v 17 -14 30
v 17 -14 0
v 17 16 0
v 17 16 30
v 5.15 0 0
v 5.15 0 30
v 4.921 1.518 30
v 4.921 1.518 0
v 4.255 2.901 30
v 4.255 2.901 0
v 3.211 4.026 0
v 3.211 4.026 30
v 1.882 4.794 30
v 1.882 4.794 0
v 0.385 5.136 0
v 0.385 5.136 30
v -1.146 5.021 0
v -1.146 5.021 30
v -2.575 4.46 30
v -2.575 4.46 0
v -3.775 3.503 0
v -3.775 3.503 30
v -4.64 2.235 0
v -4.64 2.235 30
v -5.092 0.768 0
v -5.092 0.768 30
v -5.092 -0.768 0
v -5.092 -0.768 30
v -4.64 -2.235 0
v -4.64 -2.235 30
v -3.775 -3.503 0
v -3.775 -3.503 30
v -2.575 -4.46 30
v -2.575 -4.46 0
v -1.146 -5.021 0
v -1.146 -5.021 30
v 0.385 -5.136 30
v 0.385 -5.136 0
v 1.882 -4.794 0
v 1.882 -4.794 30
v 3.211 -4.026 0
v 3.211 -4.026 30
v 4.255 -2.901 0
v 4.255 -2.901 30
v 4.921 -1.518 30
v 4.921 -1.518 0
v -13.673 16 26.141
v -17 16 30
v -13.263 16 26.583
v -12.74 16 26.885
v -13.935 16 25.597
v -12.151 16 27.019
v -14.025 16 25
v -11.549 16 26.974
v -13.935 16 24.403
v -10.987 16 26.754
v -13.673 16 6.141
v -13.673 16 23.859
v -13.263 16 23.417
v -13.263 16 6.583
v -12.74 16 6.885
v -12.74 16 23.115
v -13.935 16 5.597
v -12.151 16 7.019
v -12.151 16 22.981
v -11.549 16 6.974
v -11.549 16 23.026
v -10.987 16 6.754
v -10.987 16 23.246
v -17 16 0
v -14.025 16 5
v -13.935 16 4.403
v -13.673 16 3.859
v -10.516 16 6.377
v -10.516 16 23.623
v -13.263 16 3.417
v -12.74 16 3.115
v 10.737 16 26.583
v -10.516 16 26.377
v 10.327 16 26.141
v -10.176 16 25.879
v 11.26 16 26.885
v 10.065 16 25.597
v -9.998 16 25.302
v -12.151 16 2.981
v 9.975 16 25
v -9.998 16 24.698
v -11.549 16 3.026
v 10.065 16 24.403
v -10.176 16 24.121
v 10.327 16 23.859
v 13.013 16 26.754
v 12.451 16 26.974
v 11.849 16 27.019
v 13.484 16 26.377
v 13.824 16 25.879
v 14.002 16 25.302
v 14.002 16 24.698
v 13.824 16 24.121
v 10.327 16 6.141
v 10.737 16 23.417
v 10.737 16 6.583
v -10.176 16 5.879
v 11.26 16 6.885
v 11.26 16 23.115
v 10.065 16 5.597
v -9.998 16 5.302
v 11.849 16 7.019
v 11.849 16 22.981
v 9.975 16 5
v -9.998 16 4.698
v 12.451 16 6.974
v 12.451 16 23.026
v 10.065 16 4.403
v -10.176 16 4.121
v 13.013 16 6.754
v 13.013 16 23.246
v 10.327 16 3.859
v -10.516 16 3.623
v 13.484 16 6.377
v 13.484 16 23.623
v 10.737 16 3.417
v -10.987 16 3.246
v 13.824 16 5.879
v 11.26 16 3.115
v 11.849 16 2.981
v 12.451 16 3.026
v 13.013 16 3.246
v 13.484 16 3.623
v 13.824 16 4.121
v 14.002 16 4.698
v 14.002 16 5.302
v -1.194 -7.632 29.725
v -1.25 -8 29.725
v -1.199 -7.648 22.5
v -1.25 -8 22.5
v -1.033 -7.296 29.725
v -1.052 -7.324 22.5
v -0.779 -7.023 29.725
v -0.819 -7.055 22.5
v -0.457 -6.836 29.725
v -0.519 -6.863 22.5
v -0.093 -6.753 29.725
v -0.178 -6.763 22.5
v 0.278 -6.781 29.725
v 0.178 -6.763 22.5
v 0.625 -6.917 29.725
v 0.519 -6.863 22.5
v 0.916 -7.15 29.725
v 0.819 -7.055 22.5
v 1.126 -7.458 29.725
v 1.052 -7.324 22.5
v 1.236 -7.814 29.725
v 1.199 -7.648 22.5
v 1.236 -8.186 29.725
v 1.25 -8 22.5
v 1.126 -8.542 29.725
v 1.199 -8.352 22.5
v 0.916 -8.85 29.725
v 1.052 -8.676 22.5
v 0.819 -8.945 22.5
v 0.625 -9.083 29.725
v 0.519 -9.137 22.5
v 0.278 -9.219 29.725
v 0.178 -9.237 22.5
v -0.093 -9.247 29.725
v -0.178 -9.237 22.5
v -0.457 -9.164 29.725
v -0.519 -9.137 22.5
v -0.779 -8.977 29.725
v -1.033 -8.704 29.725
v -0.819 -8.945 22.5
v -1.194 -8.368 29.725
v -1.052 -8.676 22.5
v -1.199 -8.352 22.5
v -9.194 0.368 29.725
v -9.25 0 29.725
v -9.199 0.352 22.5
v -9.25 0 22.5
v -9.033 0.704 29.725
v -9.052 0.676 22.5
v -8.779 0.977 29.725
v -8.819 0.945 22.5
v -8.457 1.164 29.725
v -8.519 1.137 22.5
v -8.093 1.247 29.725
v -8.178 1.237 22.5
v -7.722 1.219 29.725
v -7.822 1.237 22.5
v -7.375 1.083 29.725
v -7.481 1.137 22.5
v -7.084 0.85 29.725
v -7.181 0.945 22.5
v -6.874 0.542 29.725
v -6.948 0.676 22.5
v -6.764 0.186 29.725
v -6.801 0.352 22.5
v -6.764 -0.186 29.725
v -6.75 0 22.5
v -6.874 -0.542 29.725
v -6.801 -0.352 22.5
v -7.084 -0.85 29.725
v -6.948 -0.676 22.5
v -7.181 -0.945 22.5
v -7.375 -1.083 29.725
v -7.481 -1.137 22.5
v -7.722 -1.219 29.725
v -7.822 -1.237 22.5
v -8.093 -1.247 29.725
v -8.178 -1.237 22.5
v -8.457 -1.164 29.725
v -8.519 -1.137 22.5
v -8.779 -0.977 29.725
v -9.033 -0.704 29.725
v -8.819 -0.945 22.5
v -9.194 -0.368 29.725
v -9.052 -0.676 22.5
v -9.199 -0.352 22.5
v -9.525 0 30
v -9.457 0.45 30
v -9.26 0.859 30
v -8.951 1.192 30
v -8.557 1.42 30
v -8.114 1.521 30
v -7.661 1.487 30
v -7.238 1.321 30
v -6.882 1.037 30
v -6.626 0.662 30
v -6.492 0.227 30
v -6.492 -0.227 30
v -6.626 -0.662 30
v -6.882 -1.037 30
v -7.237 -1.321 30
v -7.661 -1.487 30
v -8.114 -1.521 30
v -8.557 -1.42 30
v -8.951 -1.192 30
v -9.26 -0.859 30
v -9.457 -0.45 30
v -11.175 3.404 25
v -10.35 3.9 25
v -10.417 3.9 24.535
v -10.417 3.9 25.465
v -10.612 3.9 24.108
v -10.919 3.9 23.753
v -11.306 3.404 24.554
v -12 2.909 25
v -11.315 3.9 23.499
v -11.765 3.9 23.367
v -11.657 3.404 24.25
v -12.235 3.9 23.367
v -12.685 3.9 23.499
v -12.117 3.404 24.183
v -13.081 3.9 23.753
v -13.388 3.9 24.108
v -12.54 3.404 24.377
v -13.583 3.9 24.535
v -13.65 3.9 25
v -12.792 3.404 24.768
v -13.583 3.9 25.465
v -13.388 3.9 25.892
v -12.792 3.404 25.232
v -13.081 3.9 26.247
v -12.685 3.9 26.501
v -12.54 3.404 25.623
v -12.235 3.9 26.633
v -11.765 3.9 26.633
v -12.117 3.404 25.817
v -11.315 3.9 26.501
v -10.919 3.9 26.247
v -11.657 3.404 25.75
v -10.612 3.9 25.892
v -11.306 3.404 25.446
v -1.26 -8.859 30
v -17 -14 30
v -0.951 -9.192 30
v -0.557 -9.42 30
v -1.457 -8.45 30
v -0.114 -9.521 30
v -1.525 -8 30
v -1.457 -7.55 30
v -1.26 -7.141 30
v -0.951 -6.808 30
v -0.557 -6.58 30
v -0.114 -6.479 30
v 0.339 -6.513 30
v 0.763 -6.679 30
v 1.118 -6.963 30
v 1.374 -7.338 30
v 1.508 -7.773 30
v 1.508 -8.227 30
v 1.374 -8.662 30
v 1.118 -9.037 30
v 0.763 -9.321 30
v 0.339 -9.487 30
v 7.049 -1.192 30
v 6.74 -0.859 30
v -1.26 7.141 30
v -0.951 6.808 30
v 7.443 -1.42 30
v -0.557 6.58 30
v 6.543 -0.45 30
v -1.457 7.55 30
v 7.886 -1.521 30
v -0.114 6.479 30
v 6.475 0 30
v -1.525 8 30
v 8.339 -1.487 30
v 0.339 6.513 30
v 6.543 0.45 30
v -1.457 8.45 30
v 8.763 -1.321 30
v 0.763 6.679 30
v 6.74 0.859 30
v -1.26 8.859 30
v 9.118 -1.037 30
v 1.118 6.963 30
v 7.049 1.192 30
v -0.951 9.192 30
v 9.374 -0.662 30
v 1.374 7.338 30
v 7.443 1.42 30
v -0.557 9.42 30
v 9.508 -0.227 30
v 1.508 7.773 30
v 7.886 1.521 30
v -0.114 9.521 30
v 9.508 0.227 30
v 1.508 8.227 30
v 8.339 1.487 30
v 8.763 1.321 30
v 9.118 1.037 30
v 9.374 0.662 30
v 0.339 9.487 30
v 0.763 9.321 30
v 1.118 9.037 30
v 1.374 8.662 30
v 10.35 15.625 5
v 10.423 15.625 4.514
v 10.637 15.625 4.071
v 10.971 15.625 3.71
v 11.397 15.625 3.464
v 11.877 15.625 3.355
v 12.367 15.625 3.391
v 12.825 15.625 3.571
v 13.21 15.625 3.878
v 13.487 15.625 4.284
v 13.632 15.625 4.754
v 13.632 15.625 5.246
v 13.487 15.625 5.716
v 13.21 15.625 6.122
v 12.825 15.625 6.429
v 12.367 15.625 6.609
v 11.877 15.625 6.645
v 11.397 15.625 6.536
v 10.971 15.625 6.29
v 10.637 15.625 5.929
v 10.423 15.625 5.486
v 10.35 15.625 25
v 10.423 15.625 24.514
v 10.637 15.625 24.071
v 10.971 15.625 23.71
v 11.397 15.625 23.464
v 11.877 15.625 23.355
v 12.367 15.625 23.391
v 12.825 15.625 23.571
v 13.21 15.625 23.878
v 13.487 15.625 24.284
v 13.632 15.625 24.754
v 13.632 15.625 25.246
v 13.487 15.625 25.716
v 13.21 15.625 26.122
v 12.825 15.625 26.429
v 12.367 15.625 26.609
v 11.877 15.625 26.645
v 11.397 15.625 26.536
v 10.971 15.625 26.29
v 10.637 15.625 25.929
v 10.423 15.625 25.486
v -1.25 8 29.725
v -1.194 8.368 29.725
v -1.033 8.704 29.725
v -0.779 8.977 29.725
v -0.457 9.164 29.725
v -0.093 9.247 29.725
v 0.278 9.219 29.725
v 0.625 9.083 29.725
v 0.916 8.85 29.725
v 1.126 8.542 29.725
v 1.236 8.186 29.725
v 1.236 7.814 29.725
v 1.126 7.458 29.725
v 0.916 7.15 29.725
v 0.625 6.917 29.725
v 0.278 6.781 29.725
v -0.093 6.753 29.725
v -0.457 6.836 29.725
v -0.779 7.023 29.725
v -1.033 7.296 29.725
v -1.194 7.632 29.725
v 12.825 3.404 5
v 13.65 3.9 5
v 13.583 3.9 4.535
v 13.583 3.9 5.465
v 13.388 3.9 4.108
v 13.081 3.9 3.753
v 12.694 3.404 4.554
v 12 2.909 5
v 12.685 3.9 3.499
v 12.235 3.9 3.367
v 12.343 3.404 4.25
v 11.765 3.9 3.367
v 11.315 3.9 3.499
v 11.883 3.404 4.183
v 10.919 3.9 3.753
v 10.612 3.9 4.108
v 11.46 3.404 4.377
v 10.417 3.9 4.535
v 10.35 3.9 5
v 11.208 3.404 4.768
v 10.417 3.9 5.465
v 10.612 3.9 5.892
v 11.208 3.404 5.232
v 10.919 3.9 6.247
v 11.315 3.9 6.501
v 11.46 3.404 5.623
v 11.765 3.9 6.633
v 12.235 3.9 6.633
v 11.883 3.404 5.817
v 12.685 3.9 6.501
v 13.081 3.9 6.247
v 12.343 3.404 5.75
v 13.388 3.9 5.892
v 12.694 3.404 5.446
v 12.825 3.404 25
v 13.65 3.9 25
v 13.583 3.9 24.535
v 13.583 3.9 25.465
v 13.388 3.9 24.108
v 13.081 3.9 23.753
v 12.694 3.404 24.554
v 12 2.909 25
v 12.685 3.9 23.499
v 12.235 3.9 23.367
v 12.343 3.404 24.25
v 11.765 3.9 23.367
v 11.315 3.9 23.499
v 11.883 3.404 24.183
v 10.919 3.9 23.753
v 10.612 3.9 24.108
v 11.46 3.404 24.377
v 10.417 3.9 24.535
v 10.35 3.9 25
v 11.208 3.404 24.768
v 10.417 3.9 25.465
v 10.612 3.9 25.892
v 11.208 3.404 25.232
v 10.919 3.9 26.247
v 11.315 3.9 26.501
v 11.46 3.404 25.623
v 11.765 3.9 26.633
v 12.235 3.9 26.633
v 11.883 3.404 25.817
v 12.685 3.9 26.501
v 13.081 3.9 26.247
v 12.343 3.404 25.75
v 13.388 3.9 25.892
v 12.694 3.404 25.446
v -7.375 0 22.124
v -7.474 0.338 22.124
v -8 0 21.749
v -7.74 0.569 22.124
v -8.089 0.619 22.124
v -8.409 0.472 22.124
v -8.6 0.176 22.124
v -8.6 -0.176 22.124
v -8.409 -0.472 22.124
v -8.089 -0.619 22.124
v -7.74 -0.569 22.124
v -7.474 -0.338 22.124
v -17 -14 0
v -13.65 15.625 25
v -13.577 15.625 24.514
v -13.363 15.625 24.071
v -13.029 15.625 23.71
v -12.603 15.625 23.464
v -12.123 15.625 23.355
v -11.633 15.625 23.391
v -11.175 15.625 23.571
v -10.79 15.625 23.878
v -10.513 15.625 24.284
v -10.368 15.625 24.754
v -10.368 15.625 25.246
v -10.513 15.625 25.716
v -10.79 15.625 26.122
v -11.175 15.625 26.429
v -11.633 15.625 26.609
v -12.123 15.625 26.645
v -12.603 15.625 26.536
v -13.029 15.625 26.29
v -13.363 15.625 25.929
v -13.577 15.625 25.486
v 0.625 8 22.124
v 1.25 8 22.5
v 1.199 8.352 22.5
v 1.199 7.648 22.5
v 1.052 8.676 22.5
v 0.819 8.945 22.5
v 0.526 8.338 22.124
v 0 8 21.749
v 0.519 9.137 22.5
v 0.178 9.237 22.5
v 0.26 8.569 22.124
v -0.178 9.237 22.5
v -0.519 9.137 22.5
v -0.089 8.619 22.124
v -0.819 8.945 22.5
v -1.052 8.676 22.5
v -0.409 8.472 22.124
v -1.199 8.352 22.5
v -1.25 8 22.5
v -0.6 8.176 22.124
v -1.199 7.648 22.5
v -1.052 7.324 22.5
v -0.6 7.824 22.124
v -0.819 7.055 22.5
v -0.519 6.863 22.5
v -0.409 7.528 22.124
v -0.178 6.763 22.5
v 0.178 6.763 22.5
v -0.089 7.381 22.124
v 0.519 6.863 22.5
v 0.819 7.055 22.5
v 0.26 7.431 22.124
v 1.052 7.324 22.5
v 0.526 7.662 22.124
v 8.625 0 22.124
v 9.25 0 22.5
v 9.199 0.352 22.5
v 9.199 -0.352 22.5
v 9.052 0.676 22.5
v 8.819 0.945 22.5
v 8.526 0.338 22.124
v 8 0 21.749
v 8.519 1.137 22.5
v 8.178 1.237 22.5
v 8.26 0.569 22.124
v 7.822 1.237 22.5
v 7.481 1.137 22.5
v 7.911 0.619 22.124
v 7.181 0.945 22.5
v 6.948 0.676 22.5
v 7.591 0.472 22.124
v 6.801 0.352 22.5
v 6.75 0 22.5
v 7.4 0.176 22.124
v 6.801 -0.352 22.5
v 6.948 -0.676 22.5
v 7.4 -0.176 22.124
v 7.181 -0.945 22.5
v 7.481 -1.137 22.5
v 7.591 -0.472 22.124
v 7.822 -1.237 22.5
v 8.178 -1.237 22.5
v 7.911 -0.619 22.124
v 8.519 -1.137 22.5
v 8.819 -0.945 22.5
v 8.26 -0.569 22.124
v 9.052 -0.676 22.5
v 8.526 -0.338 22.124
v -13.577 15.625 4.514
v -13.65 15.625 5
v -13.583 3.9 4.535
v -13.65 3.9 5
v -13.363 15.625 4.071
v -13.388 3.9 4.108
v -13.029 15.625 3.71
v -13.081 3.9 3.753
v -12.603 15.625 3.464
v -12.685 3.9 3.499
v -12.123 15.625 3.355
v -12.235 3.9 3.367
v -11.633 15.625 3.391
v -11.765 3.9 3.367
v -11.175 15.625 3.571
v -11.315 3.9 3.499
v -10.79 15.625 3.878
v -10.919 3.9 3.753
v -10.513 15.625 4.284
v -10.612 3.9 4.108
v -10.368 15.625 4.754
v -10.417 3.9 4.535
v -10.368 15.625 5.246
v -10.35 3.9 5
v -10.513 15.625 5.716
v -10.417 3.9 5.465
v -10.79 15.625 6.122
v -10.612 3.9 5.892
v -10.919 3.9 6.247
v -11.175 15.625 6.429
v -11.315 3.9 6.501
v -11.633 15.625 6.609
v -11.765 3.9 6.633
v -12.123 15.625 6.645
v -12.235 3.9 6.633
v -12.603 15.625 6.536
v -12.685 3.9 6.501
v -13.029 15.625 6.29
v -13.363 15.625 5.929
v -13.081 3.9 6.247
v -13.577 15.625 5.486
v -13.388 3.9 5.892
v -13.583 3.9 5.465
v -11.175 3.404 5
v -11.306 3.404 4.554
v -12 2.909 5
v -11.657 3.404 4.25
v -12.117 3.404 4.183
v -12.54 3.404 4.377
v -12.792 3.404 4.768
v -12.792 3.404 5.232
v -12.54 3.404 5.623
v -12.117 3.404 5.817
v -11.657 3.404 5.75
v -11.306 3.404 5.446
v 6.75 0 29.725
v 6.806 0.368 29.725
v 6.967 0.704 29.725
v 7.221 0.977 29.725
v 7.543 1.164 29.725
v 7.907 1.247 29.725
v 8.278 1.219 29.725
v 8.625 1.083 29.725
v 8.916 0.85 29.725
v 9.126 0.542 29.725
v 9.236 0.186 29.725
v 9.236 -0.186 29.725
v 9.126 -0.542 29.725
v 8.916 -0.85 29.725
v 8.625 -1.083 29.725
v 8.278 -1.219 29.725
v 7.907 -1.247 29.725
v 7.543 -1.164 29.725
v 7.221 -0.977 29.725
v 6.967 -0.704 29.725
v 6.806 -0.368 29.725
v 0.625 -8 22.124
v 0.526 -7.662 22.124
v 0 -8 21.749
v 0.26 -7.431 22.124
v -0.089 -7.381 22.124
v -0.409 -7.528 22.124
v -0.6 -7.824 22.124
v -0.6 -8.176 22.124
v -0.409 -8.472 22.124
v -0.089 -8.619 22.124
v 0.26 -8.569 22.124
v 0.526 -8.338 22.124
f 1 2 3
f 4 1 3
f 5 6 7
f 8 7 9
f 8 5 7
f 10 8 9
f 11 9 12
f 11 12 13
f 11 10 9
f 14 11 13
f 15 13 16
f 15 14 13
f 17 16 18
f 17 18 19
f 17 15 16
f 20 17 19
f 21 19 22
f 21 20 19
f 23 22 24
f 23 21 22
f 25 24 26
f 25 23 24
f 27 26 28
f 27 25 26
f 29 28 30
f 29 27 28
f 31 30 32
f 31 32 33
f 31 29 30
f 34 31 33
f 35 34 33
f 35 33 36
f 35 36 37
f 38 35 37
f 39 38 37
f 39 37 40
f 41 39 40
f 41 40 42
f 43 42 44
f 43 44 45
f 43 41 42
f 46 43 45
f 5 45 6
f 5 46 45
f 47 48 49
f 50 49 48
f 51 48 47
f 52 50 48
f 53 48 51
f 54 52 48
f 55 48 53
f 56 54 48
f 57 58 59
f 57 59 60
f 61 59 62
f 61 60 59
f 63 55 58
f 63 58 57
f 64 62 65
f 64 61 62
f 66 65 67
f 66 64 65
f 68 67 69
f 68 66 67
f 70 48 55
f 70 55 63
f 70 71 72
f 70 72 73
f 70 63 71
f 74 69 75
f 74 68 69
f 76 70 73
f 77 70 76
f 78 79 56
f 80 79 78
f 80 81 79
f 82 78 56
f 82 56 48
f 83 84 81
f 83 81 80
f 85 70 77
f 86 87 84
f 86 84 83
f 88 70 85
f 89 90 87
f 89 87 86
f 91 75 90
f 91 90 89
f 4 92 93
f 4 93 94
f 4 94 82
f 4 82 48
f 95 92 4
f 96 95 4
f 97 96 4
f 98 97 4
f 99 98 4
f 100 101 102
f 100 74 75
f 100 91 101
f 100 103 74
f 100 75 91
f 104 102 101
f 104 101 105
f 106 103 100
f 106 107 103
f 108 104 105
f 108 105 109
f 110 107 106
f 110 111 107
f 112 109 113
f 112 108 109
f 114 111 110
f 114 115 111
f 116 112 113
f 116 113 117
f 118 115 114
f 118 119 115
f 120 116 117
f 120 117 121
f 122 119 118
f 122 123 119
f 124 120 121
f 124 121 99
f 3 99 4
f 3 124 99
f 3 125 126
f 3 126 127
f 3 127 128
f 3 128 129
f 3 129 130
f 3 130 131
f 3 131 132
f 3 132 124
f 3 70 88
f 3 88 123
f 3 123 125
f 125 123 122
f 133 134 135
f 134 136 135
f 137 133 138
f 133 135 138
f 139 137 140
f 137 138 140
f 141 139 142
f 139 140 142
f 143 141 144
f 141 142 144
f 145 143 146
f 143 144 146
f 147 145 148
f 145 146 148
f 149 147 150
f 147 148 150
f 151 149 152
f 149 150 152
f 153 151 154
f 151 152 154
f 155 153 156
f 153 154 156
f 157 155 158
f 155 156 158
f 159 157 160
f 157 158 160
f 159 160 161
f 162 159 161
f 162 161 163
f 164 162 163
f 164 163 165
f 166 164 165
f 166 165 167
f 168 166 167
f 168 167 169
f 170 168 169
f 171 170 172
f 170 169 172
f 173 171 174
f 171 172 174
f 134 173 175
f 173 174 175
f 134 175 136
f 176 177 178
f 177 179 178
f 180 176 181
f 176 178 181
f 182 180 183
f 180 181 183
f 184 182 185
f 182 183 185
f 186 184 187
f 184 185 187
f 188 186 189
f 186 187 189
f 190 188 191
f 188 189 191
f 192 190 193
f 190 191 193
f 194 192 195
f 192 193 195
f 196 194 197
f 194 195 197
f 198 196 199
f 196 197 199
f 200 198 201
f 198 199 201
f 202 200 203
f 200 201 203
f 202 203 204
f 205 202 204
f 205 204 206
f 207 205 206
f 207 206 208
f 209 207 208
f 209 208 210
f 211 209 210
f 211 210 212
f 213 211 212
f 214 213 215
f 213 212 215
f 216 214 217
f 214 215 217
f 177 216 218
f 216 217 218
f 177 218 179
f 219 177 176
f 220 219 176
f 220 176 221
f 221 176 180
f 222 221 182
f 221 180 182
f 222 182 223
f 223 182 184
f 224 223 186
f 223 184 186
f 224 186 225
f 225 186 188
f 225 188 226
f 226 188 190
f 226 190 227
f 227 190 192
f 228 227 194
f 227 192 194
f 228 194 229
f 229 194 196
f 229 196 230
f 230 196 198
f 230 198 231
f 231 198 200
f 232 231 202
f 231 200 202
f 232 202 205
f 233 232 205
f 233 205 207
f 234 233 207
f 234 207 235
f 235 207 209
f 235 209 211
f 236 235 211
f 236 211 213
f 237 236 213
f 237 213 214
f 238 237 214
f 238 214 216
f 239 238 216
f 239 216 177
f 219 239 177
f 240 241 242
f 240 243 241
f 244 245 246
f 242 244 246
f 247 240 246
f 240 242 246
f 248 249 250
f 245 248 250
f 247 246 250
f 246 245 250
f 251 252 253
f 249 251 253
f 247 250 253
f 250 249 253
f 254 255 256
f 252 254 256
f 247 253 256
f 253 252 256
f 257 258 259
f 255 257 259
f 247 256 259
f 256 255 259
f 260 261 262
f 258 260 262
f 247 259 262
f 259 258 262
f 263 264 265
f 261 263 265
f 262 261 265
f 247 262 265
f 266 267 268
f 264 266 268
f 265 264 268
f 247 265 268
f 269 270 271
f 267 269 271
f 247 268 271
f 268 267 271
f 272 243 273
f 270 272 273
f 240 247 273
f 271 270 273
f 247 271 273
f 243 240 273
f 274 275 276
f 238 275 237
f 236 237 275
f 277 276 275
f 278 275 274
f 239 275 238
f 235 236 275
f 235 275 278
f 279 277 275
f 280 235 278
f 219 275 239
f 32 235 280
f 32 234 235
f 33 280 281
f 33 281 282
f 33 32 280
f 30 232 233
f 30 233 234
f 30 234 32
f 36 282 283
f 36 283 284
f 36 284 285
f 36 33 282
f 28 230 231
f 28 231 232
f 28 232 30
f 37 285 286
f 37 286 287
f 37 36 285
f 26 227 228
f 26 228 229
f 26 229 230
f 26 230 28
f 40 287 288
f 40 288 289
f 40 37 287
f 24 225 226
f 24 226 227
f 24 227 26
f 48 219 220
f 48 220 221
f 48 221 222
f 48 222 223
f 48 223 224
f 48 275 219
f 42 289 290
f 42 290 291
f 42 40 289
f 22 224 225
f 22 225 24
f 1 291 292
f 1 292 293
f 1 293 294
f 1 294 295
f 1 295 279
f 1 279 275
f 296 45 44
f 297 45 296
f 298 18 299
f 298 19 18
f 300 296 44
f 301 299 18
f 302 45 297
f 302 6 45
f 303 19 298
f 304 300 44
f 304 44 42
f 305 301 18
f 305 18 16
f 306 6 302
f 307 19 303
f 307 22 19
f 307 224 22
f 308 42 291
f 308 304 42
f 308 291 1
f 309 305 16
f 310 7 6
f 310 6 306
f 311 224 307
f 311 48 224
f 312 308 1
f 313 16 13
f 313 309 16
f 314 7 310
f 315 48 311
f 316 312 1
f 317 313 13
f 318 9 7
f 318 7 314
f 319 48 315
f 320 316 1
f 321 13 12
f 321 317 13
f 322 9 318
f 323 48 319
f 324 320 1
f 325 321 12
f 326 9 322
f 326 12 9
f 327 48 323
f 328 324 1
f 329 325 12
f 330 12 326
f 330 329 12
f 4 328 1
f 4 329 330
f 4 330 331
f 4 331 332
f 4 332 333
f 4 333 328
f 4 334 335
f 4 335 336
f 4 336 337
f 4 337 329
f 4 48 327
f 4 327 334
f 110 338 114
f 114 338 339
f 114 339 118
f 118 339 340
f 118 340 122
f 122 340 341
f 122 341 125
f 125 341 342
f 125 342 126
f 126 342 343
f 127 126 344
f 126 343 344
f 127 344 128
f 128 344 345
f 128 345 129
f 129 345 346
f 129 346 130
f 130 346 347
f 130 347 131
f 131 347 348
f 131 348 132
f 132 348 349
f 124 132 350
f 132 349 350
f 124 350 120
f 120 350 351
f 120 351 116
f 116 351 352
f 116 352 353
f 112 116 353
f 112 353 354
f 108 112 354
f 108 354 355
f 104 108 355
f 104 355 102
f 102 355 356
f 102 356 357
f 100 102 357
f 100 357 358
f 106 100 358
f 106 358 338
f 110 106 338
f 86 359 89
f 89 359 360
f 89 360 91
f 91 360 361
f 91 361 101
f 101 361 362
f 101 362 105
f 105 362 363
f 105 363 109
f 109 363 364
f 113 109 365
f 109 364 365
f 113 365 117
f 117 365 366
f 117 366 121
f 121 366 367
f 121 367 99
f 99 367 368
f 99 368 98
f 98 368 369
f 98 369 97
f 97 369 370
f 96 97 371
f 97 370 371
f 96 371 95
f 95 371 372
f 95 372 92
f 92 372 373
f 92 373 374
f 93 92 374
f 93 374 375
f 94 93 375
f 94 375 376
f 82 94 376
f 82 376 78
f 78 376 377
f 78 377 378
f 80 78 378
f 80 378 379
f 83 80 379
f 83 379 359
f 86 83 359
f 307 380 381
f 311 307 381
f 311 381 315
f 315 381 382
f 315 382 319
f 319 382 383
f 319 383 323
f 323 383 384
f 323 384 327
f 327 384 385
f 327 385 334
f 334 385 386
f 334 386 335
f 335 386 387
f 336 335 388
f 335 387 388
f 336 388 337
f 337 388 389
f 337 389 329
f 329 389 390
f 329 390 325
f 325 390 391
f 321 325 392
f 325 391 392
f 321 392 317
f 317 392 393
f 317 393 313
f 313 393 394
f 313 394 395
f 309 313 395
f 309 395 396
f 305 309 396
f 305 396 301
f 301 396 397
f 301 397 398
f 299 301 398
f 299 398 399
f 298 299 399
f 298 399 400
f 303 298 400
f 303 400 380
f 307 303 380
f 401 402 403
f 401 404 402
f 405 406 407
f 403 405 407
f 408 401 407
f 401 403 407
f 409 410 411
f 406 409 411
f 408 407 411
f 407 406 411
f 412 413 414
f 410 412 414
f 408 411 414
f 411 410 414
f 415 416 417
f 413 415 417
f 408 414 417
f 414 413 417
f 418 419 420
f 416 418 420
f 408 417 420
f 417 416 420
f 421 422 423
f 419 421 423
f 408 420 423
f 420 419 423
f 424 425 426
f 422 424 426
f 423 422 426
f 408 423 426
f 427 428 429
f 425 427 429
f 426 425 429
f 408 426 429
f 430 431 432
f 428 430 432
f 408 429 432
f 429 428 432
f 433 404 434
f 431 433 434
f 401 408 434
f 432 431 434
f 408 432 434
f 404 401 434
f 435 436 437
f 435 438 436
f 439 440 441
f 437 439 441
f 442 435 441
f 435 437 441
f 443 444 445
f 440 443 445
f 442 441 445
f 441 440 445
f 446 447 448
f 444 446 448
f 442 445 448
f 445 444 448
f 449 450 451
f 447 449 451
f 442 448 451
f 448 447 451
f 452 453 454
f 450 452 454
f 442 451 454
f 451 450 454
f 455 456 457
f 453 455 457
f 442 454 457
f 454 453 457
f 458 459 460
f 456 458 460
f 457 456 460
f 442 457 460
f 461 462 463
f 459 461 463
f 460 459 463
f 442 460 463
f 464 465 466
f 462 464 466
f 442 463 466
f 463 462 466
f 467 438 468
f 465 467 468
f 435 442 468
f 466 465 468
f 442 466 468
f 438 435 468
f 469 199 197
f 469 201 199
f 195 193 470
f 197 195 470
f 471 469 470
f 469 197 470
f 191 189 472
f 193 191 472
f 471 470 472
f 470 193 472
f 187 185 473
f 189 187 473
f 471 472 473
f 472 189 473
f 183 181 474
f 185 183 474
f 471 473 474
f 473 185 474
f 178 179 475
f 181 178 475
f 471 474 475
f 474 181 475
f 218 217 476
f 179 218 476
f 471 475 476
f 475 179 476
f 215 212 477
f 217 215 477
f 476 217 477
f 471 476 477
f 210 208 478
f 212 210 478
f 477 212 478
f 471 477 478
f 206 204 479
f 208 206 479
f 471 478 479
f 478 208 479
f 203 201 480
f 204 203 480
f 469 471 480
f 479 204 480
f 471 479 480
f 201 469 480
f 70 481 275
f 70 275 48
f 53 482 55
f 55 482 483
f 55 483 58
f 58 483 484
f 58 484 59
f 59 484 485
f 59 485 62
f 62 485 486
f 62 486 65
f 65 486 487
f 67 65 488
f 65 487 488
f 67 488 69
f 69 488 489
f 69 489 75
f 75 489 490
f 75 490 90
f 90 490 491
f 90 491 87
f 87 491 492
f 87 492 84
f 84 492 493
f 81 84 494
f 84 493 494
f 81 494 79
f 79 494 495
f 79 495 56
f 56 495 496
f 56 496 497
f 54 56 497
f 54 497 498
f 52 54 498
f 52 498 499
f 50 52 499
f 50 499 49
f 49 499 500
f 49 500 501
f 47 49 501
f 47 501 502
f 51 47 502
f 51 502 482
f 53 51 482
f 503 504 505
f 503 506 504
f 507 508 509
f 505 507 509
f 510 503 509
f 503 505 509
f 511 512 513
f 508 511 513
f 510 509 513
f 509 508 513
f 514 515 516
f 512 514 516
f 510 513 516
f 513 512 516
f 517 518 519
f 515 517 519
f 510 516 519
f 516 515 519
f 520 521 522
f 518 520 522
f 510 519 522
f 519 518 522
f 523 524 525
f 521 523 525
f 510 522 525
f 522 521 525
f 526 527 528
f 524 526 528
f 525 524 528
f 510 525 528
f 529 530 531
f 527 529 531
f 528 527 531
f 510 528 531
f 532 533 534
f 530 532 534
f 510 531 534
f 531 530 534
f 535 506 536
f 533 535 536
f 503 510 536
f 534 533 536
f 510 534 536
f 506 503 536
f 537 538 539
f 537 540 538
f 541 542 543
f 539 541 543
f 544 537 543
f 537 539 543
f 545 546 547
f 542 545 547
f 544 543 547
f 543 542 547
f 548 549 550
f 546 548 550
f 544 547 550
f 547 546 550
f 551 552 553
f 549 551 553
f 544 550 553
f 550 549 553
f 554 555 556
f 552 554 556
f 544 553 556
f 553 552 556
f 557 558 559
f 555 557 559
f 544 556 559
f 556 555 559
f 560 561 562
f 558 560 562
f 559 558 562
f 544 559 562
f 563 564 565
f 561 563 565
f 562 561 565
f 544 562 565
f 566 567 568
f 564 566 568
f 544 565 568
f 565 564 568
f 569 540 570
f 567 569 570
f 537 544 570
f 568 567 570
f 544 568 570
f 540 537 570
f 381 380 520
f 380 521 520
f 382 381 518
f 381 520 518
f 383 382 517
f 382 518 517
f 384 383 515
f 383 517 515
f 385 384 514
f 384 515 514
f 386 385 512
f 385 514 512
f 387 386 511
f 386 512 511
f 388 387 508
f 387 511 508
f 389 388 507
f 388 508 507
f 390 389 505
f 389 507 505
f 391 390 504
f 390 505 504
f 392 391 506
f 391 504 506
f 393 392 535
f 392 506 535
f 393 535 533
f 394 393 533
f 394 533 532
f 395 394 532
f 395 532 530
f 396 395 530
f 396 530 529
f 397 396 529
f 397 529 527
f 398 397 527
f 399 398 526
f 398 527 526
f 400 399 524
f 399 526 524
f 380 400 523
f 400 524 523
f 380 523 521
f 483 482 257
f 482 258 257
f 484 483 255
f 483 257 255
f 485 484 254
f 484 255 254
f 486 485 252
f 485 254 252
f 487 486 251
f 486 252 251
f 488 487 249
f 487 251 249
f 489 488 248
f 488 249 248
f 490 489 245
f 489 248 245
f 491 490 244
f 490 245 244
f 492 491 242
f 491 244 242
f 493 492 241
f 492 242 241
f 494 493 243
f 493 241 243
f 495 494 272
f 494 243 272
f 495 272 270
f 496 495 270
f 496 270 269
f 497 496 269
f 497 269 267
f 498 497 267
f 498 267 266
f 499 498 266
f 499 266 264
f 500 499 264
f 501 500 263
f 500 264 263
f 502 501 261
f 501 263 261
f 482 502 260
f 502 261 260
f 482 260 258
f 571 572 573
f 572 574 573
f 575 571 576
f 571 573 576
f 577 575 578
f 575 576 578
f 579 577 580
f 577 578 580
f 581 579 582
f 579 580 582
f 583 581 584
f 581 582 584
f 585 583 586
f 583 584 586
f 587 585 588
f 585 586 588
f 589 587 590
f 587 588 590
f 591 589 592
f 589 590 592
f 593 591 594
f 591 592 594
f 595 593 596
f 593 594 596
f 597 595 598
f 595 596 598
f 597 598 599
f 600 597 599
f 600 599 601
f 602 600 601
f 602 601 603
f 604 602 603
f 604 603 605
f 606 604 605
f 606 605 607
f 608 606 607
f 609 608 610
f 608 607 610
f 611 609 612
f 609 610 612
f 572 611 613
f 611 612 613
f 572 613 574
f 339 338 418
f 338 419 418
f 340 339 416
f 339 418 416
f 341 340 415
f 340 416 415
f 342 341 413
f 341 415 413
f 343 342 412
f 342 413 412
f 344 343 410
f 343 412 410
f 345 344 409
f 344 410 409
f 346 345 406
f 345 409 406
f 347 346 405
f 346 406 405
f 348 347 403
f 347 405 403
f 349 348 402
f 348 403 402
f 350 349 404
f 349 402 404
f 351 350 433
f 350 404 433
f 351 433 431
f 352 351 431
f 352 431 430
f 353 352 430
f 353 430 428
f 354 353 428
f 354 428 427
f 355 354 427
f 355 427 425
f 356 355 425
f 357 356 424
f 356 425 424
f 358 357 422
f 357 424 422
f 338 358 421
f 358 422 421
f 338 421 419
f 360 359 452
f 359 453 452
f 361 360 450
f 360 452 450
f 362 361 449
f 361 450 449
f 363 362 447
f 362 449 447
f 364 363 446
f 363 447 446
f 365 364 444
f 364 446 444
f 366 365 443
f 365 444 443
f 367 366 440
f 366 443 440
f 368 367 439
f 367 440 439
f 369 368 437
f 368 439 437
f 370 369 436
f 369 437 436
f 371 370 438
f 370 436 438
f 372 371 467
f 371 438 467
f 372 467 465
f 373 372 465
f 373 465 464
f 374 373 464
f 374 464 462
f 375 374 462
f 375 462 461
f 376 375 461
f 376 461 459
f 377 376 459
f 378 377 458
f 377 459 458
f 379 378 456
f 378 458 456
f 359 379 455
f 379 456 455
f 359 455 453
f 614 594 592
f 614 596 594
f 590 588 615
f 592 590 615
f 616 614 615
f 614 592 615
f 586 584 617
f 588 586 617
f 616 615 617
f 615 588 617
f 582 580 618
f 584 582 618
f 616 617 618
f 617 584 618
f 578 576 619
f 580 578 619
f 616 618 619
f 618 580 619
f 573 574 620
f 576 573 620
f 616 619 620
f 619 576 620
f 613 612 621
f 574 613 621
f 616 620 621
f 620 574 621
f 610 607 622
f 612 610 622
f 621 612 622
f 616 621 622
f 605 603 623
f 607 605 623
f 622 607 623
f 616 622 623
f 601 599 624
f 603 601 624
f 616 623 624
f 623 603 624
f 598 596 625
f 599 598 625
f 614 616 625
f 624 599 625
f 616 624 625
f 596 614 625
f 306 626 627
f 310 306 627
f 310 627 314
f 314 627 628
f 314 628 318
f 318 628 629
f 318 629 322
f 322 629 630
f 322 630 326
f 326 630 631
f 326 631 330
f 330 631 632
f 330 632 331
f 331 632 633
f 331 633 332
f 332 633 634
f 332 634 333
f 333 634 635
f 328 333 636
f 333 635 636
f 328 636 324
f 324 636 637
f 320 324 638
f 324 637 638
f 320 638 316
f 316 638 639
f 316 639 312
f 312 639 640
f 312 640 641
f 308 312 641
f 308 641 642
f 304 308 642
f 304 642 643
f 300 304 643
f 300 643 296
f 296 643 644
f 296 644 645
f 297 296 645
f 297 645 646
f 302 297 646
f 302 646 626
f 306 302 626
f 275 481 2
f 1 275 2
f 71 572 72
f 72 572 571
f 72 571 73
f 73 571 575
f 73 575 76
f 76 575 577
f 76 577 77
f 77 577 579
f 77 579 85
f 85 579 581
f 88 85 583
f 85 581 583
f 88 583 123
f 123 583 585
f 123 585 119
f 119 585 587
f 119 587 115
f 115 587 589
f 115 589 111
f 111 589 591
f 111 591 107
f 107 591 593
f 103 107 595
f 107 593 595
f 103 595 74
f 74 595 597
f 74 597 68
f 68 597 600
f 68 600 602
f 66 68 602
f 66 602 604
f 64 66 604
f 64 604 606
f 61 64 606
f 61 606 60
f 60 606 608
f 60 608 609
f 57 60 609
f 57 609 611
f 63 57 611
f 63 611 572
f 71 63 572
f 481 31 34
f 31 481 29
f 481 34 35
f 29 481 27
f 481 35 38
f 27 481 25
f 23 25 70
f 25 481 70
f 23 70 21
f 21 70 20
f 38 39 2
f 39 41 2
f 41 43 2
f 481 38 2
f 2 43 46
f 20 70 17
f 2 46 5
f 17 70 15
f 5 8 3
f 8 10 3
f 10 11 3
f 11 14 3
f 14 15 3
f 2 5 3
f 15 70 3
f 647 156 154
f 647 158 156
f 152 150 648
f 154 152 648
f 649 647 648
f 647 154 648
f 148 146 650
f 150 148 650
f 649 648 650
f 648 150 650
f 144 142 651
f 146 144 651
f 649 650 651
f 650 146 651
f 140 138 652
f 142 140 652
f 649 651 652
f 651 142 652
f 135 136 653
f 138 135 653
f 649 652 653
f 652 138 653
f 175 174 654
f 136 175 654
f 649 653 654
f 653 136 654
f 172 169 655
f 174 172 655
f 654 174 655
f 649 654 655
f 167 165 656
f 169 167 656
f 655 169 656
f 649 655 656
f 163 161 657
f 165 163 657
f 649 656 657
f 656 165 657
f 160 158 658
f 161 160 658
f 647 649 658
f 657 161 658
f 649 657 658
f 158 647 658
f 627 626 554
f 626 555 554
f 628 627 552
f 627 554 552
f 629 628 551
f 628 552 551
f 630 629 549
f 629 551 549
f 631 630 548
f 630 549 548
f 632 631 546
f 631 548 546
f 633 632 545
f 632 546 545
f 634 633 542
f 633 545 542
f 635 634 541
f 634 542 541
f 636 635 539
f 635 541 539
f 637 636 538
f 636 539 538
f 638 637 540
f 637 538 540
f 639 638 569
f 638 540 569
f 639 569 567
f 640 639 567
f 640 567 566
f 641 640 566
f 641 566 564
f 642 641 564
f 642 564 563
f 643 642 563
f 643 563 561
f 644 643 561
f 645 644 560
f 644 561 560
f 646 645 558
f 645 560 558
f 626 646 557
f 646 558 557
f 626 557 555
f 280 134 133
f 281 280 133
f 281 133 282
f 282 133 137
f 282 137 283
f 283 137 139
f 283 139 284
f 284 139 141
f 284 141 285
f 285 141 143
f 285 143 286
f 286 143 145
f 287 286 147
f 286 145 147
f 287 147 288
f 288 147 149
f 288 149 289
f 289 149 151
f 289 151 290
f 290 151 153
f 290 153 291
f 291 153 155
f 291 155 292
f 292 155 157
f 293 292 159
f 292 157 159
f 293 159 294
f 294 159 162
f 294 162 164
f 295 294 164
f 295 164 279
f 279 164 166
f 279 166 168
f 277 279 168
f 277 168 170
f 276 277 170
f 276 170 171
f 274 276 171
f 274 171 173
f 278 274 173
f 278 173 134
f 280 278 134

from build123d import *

# Parameters (mm, degrees)
SKETCH_1_W                   = 34
SKETCH_1_H                   = 30
SKETCH_1_R                   = 5.15
EXTRUDE_1_DEPTH              = 30
HOLE_WIZARD_M4_1_D           = 3.3
HOLE_WIZARD_M4_1_DEPTH       = 12.1
HOLE_WIZARD_M4_1_CSINK_D     = 4.05
HOLE_WIZARD_M4_1_CSINK_ANGLE = 90
HOLE_WIZARD_M4_1_TIP         = 0.991420021
HOLE_WIZARD_M3_1_D           = 2.5
HOLE_WIZARD_M3_1_DEPTH       = 7.5
HOLE_WIZARD_M3_1_CSINK_D     = 3.05
HOLE_WIZARD_M3_1_CSINK_ANGLE = 90
HOLE_WIZARD_M3_1_TIP         = 0.751075774


with BuildPart() as part:
    # 草图1 → 凸台-拉伸1 (new body)
    with BuildSketch(Plane.XY):
        with Locations((0, 1)):
            Rectangle(SKETCH_1_W, SKETCH_1_H)
        Circle(SKETCH_1_R, mode=Mode.SUBTRACT)
    extrude(amount=EXTRUDE_1_DEPTH)

    # M4 螺纹孔1
    with Locations(Plane(origin=(0, 16, 0), x_dir=(1, 0, 0), z_dir=(0, 1, 0))):
        with Locations((-12, -5), (12, -5), (-12, -25), (12, -25)):
            CounterSinkHole(HOLE_WIZARD_M4_1_D / 2, HOLE_WIZARD_M4_1_CSINK_D / 2, depth=HOLE_WIZARD_M4_1_DEPTH, counter_sink_angle=HOLE_WIZARD_M4_1_CSINK_ANGLE)
            with Locations((0, 0, -(HOLE_WIZARD_M4_1_DEPTH + HOLE_WIZARD_M4_1_TIP / 2))):  # 118° drill point
                Cone(0, HOLE_WIZARD_M4_1_D / 2, HOLE_WIZARD_M4_1_TIP, mode=Mode.SUBTRACT)

    # M3 螺纹孔1
    with Locations(Plane.XY.offset(30)):
        with Locations((0, 8), (-8, 0), (8, 0), (0, -8)):
            CounterSinkHole(HOLE_WIZARD_M3_1_D / 2, HOLE_WIZARD_M3_1_CSINK_D / 2, depth=HOLE_WIZARD_M3_1_DEPTH, counter_sink_angle=HOLE_WIZARD_M3_1_CSINK_ANGLE)
            with Locations((0, 0, -(HOLE_WIZARD_M3_1_DEPTH + HOLE_WIZARD_M3_1_TIP / 2))):  # 118° drill point
                Cone(0, HOLE_WIZARD_M3_1_D / 2, HOLE_WIZARD_M3_1_TIP, mode=Mode.SUBTRACT)


solid = part.part
